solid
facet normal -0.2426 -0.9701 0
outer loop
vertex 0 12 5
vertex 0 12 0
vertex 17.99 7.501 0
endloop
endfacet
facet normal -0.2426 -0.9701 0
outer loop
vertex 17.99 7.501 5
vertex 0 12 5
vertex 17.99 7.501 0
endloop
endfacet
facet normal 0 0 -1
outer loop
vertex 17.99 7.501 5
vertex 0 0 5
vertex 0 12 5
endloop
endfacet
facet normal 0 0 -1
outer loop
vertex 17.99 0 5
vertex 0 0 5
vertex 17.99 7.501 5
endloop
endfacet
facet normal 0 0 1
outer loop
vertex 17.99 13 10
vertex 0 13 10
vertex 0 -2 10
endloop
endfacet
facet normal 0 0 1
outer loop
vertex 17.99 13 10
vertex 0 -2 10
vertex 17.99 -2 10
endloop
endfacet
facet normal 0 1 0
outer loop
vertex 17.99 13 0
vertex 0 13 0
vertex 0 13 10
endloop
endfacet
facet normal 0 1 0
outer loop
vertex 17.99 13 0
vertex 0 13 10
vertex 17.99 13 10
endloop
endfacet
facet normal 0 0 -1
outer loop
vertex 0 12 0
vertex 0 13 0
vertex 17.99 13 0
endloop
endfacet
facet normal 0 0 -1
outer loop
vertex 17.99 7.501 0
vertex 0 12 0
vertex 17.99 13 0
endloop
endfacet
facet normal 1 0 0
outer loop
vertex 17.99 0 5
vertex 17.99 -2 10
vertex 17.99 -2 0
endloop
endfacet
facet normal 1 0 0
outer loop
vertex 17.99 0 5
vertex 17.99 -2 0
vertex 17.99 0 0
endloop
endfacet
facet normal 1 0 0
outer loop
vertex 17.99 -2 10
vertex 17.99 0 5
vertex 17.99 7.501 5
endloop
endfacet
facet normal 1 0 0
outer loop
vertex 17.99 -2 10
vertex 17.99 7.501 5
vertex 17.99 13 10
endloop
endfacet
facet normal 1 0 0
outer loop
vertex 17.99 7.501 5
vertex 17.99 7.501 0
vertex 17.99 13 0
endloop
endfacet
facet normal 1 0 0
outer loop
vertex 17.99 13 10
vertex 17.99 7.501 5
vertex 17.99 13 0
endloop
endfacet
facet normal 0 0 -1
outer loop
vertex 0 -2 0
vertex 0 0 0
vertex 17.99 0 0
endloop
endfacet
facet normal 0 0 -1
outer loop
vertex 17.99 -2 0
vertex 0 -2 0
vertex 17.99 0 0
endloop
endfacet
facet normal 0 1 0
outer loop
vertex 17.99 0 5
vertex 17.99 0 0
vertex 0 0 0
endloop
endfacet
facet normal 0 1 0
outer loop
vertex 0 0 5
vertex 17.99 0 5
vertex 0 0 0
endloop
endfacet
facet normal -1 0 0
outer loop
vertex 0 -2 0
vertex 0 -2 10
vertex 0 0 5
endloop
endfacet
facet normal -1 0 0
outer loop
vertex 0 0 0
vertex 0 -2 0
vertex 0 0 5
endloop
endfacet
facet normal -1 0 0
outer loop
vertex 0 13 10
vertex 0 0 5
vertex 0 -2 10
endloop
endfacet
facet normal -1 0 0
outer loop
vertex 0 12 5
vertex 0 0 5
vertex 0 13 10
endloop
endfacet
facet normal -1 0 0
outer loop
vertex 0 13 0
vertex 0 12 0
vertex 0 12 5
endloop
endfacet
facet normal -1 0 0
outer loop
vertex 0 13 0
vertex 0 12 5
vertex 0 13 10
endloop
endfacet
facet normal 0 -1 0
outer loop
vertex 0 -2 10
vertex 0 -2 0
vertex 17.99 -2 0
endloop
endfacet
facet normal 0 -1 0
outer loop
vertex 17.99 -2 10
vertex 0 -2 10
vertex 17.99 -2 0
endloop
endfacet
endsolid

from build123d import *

# Parameters (mm, degrees)
PAD_DEPTH = 5
BOX_W     = 17.99
BOX_H     = 15
BOX_DEPTH = 10


with BuildPart() as f_150mmbody:
    # Sketch → Pad (new body)
    with BuildSketch(Plane(origin=(0, 0, 0), x_dir=(-1, 0, 0), z_dir=(0, 0, 1))):
        Polygon((0, 0), (0, -12), (-17.994986, -7.5), (-17.994986, 0), align=None)
    extrude(amount=PAD_DEPTH)


with BuildPart() as f_150mm:
    # Box → Box (new body)
    with BuildSketch(Plane(origin=(0, -2, 0), x_dir=(1, 0, 0), z_dir=(0, 0, 1))):
        with Locations((8.995, 7.5)):
            Rectangle(BOX_W, BOX_H)
    extrude(amount=BOX_DEPTH)

    # Cut: cut 150mmBody
    add(f_150mmbody.part, mode=Mode.SUBTRACT)


solid = f_150mm.part
